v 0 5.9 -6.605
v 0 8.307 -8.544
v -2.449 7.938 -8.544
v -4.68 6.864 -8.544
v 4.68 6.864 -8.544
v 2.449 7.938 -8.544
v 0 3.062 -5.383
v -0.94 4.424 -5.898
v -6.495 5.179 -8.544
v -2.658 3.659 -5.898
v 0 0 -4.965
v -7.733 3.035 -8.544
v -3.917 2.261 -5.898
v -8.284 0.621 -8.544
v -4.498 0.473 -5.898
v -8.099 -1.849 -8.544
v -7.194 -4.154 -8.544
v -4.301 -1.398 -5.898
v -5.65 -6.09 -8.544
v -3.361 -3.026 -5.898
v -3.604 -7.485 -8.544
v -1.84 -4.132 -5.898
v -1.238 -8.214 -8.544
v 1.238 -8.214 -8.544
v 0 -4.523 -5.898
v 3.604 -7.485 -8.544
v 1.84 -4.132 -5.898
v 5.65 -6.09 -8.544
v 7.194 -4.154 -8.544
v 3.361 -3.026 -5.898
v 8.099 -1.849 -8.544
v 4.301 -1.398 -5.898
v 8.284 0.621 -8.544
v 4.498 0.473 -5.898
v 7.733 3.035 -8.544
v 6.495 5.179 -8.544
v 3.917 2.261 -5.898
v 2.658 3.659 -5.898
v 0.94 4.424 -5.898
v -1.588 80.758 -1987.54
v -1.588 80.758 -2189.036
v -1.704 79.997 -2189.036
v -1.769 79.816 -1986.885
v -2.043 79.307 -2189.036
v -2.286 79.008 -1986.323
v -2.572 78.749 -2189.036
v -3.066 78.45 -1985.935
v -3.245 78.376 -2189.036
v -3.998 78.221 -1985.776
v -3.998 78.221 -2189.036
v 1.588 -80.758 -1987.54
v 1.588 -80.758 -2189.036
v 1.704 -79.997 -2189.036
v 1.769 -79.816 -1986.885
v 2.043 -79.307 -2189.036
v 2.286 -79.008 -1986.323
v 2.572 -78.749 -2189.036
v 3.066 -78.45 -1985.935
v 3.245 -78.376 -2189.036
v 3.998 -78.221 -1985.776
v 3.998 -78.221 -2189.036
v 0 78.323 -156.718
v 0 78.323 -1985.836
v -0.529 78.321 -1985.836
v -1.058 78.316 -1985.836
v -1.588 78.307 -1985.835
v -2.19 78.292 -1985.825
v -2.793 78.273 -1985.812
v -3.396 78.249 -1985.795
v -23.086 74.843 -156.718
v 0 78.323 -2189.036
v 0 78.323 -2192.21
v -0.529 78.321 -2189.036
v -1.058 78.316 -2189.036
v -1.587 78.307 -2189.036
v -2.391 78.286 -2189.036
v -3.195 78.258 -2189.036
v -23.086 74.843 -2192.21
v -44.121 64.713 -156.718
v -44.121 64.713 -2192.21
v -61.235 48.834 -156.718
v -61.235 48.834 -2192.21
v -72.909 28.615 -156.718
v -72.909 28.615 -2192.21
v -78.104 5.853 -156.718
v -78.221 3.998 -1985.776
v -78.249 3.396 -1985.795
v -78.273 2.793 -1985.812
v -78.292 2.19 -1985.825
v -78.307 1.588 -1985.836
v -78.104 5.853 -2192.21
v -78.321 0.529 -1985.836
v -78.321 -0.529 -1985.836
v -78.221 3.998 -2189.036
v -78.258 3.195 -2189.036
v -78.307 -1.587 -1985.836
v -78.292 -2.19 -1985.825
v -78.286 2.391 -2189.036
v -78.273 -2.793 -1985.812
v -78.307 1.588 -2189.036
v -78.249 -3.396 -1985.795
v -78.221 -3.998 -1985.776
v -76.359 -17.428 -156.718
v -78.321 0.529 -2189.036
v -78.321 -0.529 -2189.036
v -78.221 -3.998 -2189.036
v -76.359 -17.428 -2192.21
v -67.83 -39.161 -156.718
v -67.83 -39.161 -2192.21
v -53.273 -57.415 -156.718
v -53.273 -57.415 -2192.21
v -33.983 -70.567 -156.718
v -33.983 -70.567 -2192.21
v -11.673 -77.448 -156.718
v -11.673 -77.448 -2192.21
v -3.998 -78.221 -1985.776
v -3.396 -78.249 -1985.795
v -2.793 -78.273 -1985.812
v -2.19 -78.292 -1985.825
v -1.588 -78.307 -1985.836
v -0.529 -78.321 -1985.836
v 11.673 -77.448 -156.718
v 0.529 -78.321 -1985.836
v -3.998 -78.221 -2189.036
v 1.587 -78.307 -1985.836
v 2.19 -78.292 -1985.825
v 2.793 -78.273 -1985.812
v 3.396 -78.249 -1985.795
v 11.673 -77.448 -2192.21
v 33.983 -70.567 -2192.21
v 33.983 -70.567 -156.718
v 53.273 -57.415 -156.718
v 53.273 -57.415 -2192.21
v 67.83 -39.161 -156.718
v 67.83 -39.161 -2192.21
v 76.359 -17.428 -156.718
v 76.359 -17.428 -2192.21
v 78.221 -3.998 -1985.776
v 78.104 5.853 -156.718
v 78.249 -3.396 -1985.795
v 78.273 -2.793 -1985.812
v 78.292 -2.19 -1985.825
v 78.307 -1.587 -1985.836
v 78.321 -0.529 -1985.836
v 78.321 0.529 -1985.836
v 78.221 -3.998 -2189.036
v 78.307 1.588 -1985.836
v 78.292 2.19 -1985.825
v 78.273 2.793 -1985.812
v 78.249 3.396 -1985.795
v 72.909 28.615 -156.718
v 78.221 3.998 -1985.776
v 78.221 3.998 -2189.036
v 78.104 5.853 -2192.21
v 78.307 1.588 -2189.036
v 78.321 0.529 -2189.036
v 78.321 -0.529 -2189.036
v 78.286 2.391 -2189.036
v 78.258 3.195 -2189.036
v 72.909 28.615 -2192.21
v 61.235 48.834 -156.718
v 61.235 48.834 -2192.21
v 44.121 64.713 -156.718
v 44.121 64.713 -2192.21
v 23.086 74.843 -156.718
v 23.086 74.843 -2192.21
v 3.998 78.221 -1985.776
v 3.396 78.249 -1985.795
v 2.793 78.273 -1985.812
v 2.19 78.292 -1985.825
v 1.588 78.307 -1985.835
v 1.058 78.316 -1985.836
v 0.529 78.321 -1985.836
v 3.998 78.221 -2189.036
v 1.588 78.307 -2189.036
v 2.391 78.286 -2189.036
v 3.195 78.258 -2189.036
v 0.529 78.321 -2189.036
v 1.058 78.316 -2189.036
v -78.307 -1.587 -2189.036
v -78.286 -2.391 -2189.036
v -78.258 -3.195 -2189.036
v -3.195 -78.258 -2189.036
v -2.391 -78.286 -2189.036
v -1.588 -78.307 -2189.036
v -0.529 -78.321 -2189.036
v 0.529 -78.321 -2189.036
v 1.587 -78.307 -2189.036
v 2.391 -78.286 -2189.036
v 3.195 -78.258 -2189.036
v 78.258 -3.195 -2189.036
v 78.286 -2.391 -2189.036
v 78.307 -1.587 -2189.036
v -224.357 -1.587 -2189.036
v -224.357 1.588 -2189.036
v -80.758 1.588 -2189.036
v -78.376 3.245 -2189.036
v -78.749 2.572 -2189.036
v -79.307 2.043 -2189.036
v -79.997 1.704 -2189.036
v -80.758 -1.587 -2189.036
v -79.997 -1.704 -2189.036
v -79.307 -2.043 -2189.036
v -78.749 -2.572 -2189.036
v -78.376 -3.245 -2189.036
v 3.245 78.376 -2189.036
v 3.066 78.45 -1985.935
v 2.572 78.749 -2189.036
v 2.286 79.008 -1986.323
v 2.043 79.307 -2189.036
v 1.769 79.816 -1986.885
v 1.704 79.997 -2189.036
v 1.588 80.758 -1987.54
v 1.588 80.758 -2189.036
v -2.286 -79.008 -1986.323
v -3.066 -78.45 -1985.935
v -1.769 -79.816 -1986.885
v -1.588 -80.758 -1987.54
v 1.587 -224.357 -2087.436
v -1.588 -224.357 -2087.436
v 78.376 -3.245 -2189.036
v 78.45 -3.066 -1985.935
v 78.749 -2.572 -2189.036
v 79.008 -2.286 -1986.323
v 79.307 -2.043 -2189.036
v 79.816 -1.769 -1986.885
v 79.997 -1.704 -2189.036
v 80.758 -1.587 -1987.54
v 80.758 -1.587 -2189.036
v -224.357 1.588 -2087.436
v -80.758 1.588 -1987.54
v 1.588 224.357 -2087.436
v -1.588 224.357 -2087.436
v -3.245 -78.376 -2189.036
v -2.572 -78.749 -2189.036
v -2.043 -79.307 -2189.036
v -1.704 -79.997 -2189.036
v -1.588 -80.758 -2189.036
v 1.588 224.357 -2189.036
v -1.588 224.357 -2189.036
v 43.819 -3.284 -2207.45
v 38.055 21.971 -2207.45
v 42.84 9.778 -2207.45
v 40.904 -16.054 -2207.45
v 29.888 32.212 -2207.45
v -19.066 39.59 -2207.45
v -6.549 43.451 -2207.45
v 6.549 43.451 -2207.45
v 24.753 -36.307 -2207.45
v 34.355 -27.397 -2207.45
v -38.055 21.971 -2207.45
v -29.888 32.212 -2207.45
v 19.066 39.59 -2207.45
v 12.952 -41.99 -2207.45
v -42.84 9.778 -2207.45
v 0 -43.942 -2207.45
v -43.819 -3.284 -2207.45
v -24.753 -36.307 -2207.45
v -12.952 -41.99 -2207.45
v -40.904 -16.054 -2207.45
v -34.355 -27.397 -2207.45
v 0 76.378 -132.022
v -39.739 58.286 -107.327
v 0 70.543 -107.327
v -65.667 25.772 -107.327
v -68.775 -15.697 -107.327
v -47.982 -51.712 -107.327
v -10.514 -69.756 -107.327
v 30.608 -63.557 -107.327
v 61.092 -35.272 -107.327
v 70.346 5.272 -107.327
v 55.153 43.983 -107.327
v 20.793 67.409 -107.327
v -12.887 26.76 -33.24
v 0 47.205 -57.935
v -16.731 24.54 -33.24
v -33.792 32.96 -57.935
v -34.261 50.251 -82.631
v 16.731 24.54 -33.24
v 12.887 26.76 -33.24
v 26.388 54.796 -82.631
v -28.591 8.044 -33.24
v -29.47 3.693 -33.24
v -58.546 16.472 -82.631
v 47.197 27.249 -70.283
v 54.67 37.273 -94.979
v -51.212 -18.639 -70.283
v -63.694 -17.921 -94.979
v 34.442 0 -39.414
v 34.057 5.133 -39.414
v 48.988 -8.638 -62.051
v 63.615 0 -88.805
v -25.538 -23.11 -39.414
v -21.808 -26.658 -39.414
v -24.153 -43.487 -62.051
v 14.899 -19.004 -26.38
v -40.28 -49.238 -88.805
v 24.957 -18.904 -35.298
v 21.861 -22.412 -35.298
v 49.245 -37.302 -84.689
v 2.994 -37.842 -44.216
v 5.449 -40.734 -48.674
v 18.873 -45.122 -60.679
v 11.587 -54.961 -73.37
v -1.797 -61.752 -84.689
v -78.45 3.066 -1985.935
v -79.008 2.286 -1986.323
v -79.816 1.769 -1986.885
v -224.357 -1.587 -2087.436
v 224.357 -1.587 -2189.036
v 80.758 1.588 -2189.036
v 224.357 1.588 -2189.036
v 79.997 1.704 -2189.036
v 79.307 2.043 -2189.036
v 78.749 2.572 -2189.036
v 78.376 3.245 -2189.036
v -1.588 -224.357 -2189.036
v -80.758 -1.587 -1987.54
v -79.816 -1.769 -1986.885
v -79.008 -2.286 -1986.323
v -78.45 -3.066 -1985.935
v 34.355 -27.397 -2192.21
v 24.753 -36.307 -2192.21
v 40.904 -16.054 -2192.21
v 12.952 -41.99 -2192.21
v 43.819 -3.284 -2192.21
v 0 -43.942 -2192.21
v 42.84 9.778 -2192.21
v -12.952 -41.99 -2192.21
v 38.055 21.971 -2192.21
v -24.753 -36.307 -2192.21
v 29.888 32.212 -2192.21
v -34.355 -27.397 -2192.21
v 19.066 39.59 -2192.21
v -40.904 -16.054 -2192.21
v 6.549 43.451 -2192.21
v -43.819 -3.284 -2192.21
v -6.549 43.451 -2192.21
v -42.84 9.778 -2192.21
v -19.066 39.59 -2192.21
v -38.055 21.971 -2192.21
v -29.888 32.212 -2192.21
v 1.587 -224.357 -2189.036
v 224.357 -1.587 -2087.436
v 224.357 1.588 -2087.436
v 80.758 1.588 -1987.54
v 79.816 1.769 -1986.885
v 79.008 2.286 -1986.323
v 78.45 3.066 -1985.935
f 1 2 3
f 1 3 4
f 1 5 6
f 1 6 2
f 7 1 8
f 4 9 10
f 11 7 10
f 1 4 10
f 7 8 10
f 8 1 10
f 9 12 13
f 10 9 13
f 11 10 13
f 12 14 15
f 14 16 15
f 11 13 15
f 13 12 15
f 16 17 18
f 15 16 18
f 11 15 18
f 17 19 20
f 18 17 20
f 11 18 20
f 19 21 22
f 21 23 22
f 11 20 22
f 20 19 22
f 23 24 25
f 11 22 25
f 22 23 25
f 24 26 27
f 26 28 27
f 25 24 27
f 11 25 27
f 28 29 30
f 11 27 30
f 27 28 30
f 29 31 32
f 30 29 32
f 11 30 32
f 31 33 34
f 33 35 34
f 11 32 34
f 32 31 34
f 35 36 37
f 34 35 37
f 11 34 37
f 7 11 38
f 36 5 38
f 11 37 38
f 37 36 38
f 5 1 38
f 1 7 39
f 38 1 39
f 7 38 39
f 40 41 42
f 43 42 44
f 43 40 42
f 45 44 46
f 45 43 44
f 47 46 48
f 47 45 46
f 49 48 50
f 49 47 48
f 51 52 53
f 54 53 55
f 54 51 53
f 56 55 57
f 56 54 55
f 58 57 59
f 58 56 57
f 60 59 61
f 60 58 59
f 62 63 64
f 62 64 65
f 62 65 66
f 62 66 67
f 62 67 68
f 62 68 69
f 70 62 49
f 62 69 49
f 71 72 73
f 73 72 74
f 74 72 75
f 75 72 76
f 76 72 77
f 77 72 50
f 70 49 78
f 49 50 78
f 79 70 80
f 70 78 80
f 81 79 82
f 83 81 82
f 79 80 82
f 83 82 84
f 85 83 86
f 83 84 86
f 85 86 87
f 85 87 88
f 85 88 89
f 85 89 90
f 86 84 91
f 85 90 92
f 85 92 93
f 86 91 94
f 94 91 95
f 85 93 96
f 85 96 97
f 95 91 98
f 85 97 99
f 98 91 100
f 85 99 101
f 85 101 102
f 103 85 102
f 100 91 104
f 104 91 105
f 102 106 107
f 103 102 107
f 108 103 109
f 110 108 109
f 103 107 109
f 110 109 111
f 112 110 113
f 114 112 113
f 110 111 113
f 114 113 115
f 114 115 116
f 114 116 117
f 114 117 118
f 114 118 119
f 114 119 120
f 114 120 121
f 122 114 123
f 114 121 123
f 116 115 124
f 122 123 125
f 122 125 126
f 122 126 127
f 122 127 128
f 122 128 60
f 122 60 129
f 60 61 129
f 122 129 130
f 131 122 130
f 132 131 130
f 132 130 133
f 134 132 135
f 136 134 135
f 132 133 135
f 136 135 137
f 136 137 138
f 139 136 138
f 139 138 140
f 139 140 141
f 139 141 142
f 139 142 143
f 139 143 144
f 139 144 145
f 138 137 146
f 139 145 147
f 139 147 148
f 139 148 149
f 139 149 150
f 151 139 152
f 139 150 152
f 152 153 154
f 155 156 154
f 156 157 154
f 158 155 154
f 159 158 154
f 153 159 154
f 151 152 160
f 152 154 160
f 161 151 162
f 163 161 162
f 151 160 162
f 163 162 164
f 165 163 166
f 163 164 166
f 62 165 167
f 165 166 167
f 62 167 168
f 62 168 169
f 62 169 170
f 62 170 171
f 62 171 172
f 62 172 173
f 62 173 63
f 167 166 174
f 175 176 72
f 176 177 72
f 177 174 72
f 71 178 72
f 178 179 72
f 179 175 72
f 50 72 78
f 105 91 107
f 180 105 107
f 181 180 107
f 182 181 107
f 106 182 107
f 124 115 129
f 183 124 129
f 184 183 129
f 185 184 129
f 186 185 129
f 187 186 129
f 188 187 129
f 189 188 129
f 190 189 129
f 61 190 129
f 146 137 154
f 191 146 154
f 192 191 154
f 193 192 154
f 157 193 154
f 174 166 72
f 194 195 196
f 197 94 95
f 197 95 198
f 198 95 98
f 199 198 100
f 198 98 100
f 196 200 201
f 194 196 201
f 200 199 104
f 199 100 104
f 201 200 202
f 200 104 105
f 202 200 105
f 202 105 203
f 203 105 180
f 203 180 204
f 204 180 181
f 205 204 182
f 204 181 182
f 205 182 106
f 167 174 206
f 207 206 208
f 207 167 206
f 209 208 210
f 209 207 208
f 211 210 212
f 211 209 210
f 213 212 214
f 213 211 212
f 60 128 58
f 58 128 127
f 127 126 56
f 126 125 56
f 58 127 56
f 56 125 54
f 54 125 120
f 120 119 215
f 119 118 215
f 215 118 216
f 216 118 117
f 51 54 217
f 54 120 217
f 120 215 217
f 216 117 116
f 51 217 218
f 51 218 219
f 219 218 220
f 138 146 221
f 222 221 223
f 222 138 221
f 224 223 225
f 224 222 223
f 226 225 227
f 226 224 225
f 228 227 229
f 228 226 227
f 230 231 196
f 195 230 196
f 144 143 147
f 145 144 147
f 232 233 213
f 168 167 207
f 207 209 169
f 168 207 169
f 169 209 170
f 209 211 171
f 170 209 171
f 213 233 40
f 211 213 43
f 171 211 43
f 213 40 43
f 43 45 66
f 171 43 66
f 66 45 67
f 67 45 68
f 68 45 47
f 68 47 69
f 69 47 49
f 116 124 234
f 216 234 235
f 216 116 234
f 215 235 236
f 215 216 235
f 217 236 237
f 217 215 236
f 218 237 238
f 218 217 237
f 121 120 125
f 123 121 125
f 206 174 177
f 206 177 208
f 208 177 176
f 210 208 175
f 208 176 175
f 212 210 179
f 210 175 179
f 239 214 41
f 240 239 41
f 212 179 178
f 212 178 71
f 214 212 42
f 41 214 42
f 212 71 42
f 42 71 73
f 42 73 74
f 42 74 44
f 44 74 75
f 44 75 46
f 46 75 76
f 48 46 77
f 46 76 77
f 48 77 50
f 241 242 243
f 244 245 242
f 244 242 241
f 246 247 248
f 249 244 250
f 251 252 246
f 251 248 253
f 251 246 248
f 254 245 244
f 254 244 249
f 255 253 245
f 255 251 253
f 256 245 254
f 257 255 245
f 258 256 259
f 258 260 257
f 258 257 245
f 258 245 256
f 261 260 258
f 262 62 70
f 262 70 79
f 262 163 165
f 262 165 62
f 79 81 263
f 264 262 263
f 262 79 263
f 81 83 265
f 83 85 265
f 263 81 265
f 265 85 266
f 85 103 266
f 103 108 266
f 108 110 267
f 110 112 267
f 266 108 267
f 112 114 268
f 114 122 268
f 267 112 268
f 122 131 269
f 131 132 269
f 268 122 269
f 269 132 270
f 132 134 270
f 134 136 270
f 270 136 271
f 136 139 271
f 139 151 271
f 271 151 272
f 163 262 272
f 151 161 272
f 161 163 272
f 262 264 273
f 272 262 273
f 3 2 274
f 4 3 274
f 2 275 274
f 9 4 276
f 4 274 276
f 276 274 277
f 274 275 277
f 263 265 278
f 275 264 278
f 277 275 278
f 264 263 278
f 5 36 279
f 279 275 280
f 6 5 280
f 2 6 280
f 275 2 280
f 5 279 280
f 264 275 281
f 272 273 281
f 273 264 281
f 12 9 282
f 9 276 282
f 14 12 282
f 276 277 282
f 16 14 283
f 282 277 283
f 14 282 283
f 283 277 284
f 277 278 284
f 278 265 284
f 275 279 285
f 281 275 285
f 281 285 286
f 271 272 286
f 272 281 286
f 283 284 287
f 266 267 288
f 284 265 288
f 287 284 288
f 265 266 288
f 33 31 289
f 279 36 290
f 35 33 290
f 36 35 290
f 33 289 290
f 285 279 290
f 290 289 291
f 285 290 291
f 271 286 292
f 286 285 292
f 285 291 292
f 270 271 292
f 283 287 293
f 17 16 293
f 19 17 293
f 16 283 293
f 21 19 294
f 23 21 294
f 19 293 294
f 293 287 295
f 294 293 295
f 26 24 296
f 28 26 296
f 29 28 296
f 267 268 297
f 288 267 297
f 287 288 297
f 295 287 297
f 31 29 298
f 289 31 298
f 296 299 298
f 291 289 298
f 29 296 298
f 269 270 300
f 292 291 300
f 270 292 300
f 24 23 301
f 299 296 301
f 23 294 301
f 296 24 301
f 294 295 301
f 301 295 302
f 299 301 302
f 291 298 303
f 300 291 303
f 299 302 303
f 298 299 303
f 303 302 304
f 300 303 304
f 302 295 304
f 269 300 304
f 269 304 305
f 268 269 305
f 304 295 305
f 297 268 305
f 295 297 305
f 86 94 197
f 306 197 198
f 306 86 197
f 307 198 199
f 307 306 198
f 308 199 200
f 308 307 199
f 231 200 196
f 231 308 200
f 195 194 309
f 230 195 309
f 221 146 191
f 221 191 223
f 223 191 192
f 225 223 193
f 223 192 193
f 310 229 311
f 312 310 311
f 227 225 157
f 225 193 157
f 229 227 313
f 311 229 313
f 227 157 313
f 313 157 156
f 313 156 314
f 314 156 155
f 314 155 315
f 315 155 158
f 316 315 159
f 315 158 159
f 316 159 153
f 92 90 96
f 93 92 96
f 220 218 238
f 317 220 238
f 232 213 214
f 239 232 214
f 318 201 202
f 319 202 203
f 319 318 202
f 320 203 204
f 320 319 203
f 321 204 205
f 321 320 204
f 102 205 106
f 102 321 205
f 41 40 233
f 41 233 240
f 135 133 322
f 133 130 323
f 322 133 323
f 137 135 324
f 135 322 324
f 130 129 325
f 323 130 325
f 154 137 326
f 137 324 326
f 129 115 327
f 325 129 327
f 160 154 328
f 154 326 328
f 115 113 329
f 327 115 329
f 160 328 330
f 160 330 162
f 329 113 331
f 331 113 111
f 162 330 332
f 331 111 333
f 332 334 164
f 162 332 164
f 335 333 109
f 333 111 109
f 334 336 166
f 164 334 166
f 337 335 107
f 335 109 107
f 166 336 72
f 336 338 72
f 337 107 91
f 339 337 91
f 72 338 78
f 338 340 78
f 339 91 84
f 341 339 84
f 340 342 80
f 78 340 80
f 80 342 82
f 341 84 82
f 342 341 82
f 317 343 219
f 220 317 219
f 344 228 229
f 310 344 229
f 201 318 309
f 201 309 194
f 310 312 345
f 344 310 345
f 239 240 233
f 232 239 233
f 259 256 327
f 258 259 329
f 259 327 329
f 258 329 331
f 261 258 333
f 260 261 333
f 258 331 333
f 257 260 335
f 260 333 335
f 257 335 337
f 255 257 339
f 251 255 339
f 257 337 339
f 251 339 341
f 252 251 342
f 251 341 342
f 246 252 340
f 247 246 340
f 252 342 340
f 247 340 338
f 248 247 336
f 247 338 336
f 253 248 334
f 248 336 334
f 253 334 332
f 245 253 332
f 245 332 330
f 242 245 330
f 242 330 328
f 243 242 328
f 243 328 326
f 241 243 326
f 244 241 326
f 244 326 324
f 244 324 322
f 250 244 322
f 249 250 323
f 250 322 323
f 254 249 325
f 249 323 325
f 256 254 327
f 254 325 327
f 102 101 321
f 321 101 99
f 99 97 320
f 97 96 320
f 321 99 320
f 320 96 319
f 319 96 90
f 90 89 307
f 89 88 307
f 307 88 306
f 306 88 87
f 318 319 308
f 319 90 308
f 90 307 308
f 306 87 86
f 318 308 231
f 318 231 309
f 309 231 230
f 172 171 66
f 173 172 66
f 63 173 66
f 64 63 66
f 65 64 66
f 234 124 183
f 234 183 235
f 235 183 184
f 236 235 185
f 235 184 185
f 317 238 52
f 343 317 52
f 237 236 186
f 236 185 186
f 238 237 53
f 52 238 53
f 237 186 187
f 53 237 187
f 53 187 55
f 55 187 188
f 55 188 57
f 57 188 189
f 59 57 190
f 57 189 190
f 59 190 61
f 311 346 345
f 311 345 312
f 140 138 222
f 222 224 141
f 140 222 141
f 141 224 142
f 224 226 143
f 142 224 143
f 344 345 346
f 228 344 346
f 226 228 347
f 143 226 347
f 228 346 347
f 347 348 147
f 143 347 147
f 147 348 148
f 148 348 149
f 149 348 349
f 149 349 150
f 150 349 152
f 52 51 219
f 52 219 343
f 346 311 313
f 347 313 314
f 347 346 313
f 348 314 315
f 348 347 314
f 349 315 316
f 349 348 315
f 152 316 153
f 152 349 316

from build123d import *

# Parameters (mm, degrees)
SKETCH3_R                = 43.942
BOSS_EXTRUDE1_DEPTH      = 15.24
BOSS_EXTRUDE2_REACH      = 2235.699
BOSS_EXTRUDE2_END_RADIUS = 78.32293196
SKETCH4_W                = 3.175
SKETCH4_H                = 203.2
CUT_EXTRUDE1_REACH       = 2225.452
FILLET1_R                = 2.54
CIRPATTERN1_COUNT        = 4
FILLET1_OF_CIRPATTERN1_R = 2.54


with BuildPart() as part:
    # Sketch2 → Revolve1 (revolve)
    with BuildSketch(Plane(origin=(0, 0, 0), x_dir=(0, 0, -1), z_dir=(1, 0, 0))):
        with BuildLine():
            Line((156.718, 78.322932), (2192.2105, 78.322932))
            Line((2192.2105, 78.322932), (2192.2105, 4e-08))
            Line((2192.2105, 4e-08), (4.964740615, 4e-08))
            ThreePointArc((4.964740615, 4e-08), (5.897622526, 4.522765989), (8.543990278, 8.307263076))
            add(Edge.make_bspline(
                [(8.543990278, 8.307263076), (82.630995139, 78.322932), (156.718, 78.322932)],
                knots=[0.068626342, 0.068626342, 0.068626342, 0.915329667, 0.915329667, 0.915329667], degree=2))
        make_face()
    revolve(axis=Axis((0, 4e-08, -2192.2105), (0, 0, 1)))

    # Sketch3 → Boss-Extrude1 (add)
    with BuildSketch(Plane(origin=(0, 0, -2192.2105), x_dir=(-1, 0, 0), z_dir=(0, 0, -1))):
        with Locations(Location((0, 0, 0), (0, 0, 270))):
            Circle(SKETCH3_R)
    extrude(amount=BOSS_EXTRUDE1_DEPTH)

    # Boss-Extrude2: up to this cylinder (the profile starts outside it)
    boss_extrude2_end = Plane(origin=(0, 4e-08, -2087.4355), z_dir=(0, 0, -1)) * Cylinder(BOSS_EXTRUDE2_END_RADIUS, 4629.043863919, mode=Mode.PRIVATE)
    # Sketch4 → Boss-Extrude2 (add, up to the surface)
    with BuildSketch(Plane(origin=(0, 254, 0), x_dir=(1, 0, 0), z_dir=(0, 1, 0)), mode=Mode.PRIVATE) as boss_extrude2_sk1:
        with Locations((0, 2087.4355)):
            Rectangle(SKETCH4_W, SKETCH4_H)
    boss_extrude2_tool1 = extrude(boss_extrude2_sk1.sketch, amount=-BOSS_EXTRUDE2_REACH, mode=Mode.PRIVATE) - boss_extrude2_end
    boss_extrude2 = boss_extrude2_tool1.solids().sort_by_distance((0, 254, -2087.4355))[0]
    add(boss_extrude2)

    # Sketch5 → Cut-Extrude1 (cut, up to next)
    with BuildSketch(Plane.ZY.offset(1.5875), mode=Mode.PRIVATE) as cut_extrude1_sk1:
        Polygon((-2189.0355, 224.356842107), (-2087.4355, 224.356842107), (-1985.8355, 78.306842107), (-1985.8355, 254), (-2189.0355, 254), align=None)
    cut_extrude1_tool1 = extrude(cut_extrude1_sk1.sketch, amount=-CUT_EXTRUDE1_REACH, mode=Mode.PRIVATE) & part.part
    cut_extrude1 = cut_extrude1_tool1.solids().sort_by_distance((-1.5875, 204.128915, -2050.052252))[0]
    add(cut_extrude1, mode=Mode.SUBTRACT)

    # Fillet1
    # the kernel refuses this fillet: 2.54 mm, written as the material it adds along each edge
    with BuildSketch(Plane(origin=(-1.5875, 78.306842107, -1979.708797857), x_dir=(-0.9993639751492599, -0.03566013423796214, 0), z_dir=(0, 0, -1))) as fillet1_piece_1_section:
        with BuildLine():
            CenterArc((2.450992889, 2.539698904), FILLET1_R, 182.043608469, 87.074170623)
            Line((-0.087391608, 2.449122163), (0, 0))
            ThreePointArc((0, 0), (1.205942189, 0.009284527), (2.411884379, 0))
        make_face()
    fillet1_piece_1 = extrude(amount=209.326702143, mode=Mode.PRIVATE)
    fillet1_piece_1 = split(fillet1_piece_1, bisect_by=Plane(origin=(-3.095055571, 78.248638535, -1985.795010558), z_dir=(0, -0.5710644881985977, -0.8209052017854886)), keep=Keep.TOP, mode=Mode.PRIVATE)
    add(fillet1_piece_1)
    with BuildSketch(Plane(origin=(1.5875, 78.306842107, -1979.708797857), x_dir=(0.9993639751492599, -0.035660134237962375, 0), z_dir=(0, 0, -1))) as fillet1_piece_2_section:
        with BuildLine():
            CenterArc((2.450992889, -2.539698904), FILLET1_R, 90.882220908, 87.074170623)
            Line((-0.087391608, -2.449122163), (0, 0))
            ThreePointArc((0, 0), (1.205942189, -0.009284527), (2.411884379, 0))
        make_face()
    fillet1_piece_2 = extrude(amount=209.326702143, mode=Mode.PRIVATE)
    fillet1_piece_2 = split(fillet1_piece_2, bisect_by=Plane(origin=(3.095055571, 78.248638535, -1985.795010558), z_dir=(0, -0.5710644881985977, -0.8209052017854886)), keep=Keep.TOP, mode=Mode.PRIVATE)
    add(fillet1_piece_2)

    # CirPattern1: Boss-Extrude2, Cut-Extrude1 ×4 about axis
    cirpattern1_axis = Axis((0, 1.7e-08, 0), (0, 0, 1))
    add([boss_extrude2.rotate(cirpattern1_axis, i * 360 / CIRPATTERN1_COUNT) for i in range(1, CIRPATTERN1_COUNT)])
    add([cut_extrude1.rotate(cirpattern1_axis, i * 360 / CIRPATTERN1_COUNT) for i in range(1, CIRPATTERN1_COUNT)], mode=Mode.SUBTRACT)

    # Fillet1 of CirPattern1
    # the kernel refuses this fillet: 2.54 mm, written as the material it adds along each edge
    with BuildSketch(Plane(origin=(-78.306842067, -1.587499983, -1979.708797917), x_dir=(0.03566013452716192, -0.9993639751389404, 0), z_dir=(0, 0, -1))) as fillet1_of_cirpattern1_piece_1_section:
        with BuildLine():
            CenterArc((2.450992888, 2.539698904), FILLET1_OF_CIRPATTERN1_R, 182.043608486, 87.074170607)
            Line((-0.087391609, 2.449122163), (0, 0))
            ThreePointArc((0, 0), (1.205942189, 0.009284527), (2.411884378, 0))
        make_face()
    fillet1_of_cirpattern1_piece_1 = extrude(amount=209.326702083, mode=Mode.PRIVATE)
    fillet1_of_cirpattern1_piece_1 = split(fillet1_of_cirpattern1_piece_1, bisect_by=Plane(origin=(-78.248638505, -3.095055439, -1985.79501055), z_dir=(0.5710644881985977, 0, -0.8209052017854886)), keep=Keep.TOP, mode=Mode.PRIVATE)
    add(fillet1_of_cirpattern1_piece_1)
    with BuildSketch(Plane(origin=(-78.306842068, 1.587500017, -1979.708797911), x_dir=(0.03566013394875642, 0.9993639751595796, 0), z_dir=(0, 0, -1))) as fillet1_of_cirpattern1_piece_2_section:
        with BuildLine():
            CenterArc((2.450992889, -2.539698904), FILLET1_OF_CIRPATTERN1_R, 90.882220908, 87.074170639)
            Line((-0.087391608, -2.449122164), (0, 0))
            ThreePointArc((0, 0), (1.20594219, -0.009284527), (2.411884379, 0))
        make_face()
    fillet1_of_cirpattern1_piece_2 = extrude(amount=209.326702089, mode=Mode.PRIVATE)
    fillet1_of_cirpattern1_piece_2 = split(fillet1_of_cirpattern1_piece_2, bisect_by=Plane(origin=(-78.248638506, 3.095055478, -1985.79501055), z_dir=(0.5710644881985977, 0, -0.8209052017854886)), keep=Keep.TOP, mode=Mode.PRIVATE)
    add(fillet1_of_cirpattern1_piece_2)
    with BuildSketch(Plane(origin=(1.5875, -78.306842027, -1979.708797972), x_dir=(0.9993639751492599, 0.03566013423796238, 0), z_dir=(0, 0, -1))) as fillet1_of_cirpattern1_piece_3_section:
        with BuildLine():
            CenterArc((2.450992889, 2.539698904), FILLET1_OF_CIRPATTERN1_R, 182.043608469, 87.074170623)
            Line((-0.087391608, 2.449122163), (0, 0))
            ThreePointArc((0, 0), (1.205942189, 0.009284527), (2.411884379, 0))
        make_face()
    fillet1_of_cirpattern1_piece_3 = extrude(amount=209.326702028, mode=Mode.PRIVATE)
    fillet1_of_cirpattern1_piece_3 = split(fillet1_of_cirpattern1_piece_3, bisect_by=Plane(origin=(3.095055347, -78.248638477, -1985.795010542), z_dir=(0, 0.5710644881985977, -0.8209052017854886)), keep=Keep.TOP, mode=Mode.PRIVATE)
    add(fillet1_of_cirpattern1_piece_3)
    with BuildSketch(Plane(origin=(-1.5875, -78.306842027, -1979.708797972), x_dir=(-0.9993639751492599, 0.03566013423796186, 0), z_dir=(0, 0, -1))) as fillet1_of_cirpattern1_piece_4_section:
        with BuildLine():
            CenterArc((2.450992889, -2.539698904), FILLET1_OF_CIRPATTERN1_R, 90.882220908, 87.074170623)
            Line((-0.087391608, -2.449122163), (0, 0))
            ThreePointArc((0, 0), (1.205942189, -0.009284527), (2.411884379, 0))
        make_face()
    fillet1_of_cirpattern1_piece_4 = extrude(amount=209.326702028, mode=Mode.PRIVATE)
    fillet1_of_cirpattern1_piece_4 = split(fillet1_of_cirpattern1_piece_4, bisect_by=Plane(origin=(-3.095055347, -78.248638477, -1985.795010542), z_dir=(0, 0.5710644881985977, -0.8209052017854886)), keep=Keep.TOP, mode=Mode.PRIVATE)
    add(fillet1_of_cirpattern1_piece_4)
    with BuildSketch(Plane(origin=(78.306842068, 1.587500017, -1979.708797911), x_dir=(-0.03566013394876229, 0.9993639751595792, 0), z_dir=(0, 0, -1))) as fillet1_of_cirpattern1_piece_5_section:
        with BuildLine():
            CenterArc((2.450992889, 2.539698904), FILLET1_OF_CIRPATTERN1_R, 182.043608452, 87.074170639)
            Line((-0.087391608, 2.449122164), (0, 0))
            ThreePointArc((0, 0), (1.20594219, 0.009284527), (2.411884379, 0))
        make_face()
    fillet1_of_cirpattern1_piece_5 = extrude(amount=209.326702089, mode=Mode.PRIVATE)
    fillet1_of_cirpattern1_piece_5 = split(fillet1_of_cirpattern1_piece_5, bisect_by=Plane(origin=(78.248638506, 3.095055478, -1985.79501055), z_dir=(-0.5710644881985977, 0, -0.8209052017854886)), keep=Keep.TOP, mode=Mode.PRIVATE)
    add(fillet1_of_cirpattern1_piece_5)
    with BuildSketch(Plane(origin=(78.306842067, -1.587499983, -1979.708797917), x_dir=(-0.03566013452716244, -0.9993639751389404, 0), z_dir=(0, 0, -1))) as fillet1_of_cirpattern1_piece_6_section:
        with BuildLine():
            CenterArc((2.450992888, -2.539698904), FILLET1_OF_CIRPATTERN1_R, 90.882220908, 87.074170607)
            Line((-0.087391609, -2.449122163), (0, 0))
            ThreePointArc((0, 0), (1.205942189, -0.009284527), (2.411884378, 0))
        make_face()
    fillet1_of_cirpattern1_piece_6 = extrude(amount=209.326702083, mode=Mode.PRIVATE)
    fillet1_of_cirpattern1_piece_6 = split(fillet1_of_cirpattern1_piece_6, bisect_by=Plane(origin=(78.248638505, -3.095055439, -1985.79501055), z_dir=(-0.5710644881985977, 0, -0.8209052017854886)), keep=Keep.TOP, mode=Mode.PRIVATE)
    add(fillet1_of_cirpattern1_piece_6)


solid = part.part
